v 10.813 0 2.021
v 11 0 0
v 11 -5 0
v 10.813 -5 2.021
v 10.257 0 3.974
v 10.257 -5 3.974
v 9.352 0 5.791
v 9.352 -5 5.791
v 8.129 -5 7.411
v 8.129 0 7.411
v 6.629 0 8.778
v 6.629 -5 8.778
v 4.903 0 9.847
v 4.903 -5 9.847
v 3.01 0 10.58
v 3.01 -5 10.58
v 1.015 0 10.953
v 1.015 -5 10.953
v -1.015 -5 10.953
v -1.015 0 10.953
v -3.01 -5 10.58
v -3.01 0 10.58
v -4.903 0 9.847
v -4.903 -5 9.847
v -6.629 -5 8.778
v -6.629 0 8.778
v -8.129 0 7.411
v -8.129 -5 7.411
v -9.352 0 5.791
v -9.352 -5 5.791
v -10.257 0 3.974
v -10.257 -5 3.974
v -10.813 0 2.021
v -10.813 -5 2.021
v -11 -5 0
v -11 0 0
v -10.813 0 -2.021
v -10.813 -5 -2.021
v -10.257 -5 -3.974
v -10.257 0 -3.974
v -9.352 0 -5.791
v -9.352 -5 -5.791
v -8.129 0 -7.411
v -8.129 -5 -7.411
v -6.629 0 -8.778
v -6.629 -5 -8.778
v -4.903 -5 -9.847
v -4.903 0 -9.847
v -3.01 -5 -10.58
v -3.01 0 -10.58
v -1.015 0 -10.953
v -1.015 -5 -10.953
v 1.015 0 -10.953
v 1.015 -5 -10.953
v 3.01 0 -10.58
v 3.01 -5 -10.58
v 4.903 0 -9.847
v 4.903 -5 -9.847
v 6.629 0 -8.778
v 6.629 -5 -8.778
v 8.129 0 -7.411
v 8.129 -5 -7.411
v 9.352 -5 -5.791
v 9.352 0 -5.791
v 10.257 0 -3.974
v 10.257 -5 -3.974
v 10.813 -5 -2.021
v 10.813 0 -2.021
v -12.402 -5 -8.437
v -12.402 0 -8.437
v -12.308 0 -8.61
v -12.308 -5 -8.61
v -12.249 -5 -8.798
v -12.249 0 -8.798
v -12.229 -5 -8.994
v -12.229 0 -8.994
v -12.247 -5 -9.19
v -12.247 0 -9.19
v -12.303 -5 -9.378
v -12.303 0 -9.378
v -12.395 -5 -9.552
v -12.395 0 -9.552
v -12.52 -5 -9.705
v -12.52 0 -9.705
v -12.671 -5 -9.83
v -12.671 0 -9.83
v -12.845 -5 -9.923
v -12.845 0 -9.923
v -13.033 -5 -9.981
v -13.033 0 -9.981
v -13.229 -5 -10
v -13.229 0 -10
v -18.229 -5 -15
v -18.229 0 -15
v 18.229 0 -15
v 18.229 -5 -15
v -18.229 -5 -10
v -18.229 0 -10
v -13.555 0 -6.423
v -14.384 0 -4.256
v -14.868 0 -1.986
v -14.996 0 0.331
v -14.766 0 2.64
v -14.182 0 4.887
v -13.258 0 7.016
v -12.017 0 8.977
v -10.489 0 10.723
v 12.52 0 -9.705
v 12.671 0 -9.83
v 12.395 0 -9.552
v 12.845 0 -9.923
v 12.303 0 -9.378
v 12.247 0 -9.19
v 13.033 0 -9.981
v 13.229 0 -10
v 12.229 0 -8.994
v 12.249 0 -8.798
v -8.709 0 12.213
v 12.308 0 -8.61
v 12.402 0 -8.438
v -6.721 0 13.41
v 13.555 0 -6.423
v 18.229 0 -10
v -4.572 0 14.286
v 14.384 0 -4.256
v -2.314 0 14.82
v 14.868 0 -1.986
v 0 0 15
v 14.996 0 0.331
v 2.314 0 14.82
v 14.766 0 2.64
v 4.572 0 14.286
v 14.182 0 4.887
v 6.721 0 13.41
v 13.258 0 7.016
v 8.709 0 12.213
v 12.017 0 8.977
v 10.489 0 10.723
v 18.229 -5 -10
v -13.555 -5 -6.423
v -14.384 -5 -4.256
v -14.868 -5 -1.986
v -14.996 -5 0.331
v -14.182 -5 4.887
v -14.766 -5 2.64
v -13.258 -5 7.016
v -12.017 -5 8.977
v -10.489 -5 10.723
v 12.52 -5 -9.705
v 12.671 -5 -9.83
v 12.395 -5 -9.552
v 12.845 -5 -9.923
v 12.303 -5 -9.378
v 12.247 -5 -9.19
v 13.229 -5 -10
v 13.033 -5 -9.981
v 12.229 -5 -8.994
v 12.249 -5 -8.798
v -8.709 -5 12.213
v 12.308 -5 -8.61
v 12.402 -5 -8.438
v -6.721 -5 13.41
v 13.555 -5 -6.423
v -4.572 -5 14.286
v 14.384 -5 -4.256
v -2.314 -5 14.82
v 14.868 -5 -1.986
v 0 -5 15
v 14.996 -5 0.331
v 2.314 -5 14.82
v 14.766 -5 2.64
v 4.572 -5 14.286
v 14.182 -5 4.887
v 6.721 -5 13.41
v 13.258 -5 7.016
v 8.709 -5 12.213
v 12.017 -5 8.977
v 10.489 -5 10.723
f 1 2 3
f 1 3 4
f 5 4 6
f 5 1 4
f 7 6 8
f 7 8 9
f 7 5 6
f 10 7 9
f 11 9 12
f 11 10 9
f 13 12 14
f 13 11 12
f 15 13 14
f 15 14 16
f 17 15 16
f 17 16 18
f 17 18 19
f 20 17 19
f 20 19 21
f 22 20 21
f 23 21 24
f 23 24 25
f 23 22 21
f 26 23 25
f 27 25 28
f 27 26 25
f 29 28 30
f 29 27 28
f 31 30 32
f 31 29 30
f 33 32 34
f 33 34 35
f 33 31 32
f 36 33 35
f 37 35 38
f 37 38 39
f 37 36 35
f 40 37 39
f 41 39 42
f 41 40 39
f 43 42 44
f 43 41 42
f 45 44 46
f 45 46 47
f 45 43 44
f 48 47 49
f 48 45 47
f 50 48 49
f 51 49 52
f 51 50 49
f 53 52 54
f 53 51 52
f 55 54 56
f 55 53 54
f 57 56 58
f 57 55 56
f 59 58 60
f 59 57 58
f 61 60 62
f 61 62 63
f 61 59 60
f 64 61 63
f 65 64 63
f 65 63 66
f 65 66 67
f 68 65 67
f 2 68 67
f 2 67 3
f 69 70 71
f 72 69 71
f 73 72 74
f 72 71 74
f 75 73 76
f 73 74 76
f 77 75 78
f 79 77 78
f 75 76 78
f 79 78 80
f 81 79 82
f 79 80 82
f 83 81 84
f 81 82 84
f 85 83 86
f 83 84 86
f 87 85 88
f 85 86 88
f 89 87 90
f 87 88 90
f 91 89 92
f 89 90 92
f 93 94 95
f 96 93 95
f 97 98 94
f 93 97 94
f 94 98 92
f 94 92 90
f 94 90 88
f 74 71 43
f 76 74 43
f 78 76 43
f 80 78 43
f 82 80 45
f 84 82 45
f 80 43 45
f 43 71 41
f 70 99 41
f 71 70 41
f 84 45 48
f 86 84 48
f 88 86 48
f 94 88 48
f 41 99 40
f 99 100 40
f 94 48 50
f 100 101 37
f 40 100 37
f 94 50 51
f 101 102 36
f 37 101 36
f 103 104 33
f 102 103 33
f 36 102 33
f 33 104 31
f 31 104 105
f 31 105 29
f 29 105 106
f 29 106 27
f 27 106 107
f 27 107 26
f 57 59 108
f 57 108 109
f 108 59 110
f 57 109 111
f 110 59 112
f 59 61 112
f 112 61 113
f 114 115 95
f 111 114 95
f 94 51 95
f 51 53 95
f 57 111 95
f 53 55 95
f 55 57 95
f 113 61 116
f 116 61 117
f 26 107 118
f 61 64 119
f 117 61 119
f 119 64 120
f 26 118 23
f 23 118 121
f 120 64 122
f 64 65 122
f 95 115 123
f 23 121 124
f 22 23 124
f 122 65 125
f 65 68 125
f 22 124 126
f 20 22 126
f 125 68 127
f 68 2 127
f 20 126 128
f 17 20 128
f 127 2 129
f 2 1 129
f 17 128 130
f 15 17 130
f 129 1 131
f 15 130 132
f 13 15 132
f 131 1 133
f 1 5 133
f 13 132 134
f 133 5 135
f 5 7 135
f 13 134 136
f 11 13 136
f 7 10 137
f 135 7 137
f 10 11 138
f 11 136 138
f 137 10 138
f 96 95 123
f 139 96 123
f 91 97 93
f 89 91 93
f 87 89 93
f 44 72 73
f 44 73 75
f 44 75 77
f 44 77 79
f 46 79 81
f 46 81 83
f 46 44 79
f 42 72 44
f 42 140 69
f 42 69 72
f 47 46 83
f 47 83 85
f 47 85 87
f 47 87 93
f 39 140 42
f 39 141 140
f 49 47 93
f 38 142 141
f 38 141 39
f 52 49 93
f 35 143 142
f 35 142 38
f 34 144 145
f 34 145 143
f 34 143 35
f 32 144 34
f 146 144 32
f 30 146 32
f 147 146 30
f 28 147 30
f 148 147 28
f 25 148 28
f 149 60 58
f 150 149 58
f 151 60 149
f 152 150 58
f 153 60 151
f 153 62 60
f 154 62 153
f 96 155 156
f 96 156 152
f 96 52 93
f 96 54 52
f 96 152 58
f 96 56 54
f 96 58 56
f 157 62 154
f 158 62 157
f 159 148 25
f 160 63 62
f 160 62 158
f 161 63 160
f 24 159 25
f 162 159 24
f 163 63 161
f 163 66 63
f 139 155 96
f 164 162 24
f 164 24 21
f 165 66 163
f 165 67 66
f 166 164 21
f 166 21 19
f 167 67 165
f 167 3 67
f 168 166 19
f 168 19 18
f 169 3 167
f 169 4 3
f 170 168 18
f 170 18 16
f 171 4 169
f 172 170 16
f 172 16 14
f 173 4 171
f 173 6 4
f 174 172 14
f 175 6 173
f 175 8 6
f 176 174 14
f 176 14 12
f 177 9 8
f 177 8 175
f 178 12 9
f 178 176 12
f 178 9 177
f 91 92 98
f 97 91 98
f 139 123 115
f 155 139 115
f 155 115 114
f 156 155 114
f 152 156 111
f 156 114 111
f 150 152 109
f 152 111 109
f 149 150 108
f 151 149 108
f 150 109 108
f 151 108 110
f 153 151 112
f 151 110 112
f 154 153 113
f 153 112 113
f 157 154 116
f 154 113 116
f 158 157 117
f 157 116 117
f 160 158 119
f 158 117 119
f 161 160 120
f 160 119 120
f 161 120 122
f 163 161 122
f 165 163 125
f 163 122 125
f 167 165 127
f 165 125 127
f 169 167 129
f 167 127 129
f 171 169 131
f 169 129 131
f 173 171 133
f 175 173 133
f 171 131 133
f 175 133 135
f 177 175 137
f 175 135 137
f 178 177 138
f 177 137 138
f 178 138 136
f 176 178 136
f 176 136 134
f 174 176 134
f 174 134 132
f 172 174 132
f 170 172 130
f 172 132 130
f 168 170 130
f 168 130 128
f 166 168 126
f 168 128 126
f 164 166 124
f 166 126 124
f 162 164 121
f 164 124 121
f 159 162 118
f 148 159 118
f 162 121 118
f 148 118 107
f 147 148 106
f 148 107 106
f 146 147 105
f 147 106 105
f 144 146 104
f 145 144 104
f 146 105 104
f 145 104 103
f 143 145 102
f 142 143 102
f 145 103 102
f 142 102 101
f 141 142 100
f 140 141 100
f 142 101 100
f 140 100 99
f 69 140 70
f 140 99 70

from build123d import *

# Parameters (mm, degrees)
F0_R     = 11
F1_DEPTH = 5


with BuildPart() as f1:
    # F0 (on Front) → F1 (new body)
    with BuildSketch(Plane.XZ):
        with BuildLine():
            ThreePointArc((13.228757, -10), (12.344873, -9.467707), (12.401959, -8.4375))
            ThreePointArc((12.401959, -8.4375), (0, 15), (-12.401959, -8.4375))
            ThreePointArc((-12.401959, -8.4375), (-12.344873, -9.467707), (-13.228757, -10))
            Line((-13.228757, -10), (-18.228757, -10))
            Line((-18.228757, -10), (-18.228757, -15))
            Line((-18.228757, -15), (18.228757, -15))
            Line((18.228757, -15), (18.228757, -10))
            Line((18.228757, -10), (13.228757, -10))
        make_face()
        Circle(F0_R, mode=Mode.SUBTRACT)
    extrude(amount=F1_DEPTH)


solid = f1.part
